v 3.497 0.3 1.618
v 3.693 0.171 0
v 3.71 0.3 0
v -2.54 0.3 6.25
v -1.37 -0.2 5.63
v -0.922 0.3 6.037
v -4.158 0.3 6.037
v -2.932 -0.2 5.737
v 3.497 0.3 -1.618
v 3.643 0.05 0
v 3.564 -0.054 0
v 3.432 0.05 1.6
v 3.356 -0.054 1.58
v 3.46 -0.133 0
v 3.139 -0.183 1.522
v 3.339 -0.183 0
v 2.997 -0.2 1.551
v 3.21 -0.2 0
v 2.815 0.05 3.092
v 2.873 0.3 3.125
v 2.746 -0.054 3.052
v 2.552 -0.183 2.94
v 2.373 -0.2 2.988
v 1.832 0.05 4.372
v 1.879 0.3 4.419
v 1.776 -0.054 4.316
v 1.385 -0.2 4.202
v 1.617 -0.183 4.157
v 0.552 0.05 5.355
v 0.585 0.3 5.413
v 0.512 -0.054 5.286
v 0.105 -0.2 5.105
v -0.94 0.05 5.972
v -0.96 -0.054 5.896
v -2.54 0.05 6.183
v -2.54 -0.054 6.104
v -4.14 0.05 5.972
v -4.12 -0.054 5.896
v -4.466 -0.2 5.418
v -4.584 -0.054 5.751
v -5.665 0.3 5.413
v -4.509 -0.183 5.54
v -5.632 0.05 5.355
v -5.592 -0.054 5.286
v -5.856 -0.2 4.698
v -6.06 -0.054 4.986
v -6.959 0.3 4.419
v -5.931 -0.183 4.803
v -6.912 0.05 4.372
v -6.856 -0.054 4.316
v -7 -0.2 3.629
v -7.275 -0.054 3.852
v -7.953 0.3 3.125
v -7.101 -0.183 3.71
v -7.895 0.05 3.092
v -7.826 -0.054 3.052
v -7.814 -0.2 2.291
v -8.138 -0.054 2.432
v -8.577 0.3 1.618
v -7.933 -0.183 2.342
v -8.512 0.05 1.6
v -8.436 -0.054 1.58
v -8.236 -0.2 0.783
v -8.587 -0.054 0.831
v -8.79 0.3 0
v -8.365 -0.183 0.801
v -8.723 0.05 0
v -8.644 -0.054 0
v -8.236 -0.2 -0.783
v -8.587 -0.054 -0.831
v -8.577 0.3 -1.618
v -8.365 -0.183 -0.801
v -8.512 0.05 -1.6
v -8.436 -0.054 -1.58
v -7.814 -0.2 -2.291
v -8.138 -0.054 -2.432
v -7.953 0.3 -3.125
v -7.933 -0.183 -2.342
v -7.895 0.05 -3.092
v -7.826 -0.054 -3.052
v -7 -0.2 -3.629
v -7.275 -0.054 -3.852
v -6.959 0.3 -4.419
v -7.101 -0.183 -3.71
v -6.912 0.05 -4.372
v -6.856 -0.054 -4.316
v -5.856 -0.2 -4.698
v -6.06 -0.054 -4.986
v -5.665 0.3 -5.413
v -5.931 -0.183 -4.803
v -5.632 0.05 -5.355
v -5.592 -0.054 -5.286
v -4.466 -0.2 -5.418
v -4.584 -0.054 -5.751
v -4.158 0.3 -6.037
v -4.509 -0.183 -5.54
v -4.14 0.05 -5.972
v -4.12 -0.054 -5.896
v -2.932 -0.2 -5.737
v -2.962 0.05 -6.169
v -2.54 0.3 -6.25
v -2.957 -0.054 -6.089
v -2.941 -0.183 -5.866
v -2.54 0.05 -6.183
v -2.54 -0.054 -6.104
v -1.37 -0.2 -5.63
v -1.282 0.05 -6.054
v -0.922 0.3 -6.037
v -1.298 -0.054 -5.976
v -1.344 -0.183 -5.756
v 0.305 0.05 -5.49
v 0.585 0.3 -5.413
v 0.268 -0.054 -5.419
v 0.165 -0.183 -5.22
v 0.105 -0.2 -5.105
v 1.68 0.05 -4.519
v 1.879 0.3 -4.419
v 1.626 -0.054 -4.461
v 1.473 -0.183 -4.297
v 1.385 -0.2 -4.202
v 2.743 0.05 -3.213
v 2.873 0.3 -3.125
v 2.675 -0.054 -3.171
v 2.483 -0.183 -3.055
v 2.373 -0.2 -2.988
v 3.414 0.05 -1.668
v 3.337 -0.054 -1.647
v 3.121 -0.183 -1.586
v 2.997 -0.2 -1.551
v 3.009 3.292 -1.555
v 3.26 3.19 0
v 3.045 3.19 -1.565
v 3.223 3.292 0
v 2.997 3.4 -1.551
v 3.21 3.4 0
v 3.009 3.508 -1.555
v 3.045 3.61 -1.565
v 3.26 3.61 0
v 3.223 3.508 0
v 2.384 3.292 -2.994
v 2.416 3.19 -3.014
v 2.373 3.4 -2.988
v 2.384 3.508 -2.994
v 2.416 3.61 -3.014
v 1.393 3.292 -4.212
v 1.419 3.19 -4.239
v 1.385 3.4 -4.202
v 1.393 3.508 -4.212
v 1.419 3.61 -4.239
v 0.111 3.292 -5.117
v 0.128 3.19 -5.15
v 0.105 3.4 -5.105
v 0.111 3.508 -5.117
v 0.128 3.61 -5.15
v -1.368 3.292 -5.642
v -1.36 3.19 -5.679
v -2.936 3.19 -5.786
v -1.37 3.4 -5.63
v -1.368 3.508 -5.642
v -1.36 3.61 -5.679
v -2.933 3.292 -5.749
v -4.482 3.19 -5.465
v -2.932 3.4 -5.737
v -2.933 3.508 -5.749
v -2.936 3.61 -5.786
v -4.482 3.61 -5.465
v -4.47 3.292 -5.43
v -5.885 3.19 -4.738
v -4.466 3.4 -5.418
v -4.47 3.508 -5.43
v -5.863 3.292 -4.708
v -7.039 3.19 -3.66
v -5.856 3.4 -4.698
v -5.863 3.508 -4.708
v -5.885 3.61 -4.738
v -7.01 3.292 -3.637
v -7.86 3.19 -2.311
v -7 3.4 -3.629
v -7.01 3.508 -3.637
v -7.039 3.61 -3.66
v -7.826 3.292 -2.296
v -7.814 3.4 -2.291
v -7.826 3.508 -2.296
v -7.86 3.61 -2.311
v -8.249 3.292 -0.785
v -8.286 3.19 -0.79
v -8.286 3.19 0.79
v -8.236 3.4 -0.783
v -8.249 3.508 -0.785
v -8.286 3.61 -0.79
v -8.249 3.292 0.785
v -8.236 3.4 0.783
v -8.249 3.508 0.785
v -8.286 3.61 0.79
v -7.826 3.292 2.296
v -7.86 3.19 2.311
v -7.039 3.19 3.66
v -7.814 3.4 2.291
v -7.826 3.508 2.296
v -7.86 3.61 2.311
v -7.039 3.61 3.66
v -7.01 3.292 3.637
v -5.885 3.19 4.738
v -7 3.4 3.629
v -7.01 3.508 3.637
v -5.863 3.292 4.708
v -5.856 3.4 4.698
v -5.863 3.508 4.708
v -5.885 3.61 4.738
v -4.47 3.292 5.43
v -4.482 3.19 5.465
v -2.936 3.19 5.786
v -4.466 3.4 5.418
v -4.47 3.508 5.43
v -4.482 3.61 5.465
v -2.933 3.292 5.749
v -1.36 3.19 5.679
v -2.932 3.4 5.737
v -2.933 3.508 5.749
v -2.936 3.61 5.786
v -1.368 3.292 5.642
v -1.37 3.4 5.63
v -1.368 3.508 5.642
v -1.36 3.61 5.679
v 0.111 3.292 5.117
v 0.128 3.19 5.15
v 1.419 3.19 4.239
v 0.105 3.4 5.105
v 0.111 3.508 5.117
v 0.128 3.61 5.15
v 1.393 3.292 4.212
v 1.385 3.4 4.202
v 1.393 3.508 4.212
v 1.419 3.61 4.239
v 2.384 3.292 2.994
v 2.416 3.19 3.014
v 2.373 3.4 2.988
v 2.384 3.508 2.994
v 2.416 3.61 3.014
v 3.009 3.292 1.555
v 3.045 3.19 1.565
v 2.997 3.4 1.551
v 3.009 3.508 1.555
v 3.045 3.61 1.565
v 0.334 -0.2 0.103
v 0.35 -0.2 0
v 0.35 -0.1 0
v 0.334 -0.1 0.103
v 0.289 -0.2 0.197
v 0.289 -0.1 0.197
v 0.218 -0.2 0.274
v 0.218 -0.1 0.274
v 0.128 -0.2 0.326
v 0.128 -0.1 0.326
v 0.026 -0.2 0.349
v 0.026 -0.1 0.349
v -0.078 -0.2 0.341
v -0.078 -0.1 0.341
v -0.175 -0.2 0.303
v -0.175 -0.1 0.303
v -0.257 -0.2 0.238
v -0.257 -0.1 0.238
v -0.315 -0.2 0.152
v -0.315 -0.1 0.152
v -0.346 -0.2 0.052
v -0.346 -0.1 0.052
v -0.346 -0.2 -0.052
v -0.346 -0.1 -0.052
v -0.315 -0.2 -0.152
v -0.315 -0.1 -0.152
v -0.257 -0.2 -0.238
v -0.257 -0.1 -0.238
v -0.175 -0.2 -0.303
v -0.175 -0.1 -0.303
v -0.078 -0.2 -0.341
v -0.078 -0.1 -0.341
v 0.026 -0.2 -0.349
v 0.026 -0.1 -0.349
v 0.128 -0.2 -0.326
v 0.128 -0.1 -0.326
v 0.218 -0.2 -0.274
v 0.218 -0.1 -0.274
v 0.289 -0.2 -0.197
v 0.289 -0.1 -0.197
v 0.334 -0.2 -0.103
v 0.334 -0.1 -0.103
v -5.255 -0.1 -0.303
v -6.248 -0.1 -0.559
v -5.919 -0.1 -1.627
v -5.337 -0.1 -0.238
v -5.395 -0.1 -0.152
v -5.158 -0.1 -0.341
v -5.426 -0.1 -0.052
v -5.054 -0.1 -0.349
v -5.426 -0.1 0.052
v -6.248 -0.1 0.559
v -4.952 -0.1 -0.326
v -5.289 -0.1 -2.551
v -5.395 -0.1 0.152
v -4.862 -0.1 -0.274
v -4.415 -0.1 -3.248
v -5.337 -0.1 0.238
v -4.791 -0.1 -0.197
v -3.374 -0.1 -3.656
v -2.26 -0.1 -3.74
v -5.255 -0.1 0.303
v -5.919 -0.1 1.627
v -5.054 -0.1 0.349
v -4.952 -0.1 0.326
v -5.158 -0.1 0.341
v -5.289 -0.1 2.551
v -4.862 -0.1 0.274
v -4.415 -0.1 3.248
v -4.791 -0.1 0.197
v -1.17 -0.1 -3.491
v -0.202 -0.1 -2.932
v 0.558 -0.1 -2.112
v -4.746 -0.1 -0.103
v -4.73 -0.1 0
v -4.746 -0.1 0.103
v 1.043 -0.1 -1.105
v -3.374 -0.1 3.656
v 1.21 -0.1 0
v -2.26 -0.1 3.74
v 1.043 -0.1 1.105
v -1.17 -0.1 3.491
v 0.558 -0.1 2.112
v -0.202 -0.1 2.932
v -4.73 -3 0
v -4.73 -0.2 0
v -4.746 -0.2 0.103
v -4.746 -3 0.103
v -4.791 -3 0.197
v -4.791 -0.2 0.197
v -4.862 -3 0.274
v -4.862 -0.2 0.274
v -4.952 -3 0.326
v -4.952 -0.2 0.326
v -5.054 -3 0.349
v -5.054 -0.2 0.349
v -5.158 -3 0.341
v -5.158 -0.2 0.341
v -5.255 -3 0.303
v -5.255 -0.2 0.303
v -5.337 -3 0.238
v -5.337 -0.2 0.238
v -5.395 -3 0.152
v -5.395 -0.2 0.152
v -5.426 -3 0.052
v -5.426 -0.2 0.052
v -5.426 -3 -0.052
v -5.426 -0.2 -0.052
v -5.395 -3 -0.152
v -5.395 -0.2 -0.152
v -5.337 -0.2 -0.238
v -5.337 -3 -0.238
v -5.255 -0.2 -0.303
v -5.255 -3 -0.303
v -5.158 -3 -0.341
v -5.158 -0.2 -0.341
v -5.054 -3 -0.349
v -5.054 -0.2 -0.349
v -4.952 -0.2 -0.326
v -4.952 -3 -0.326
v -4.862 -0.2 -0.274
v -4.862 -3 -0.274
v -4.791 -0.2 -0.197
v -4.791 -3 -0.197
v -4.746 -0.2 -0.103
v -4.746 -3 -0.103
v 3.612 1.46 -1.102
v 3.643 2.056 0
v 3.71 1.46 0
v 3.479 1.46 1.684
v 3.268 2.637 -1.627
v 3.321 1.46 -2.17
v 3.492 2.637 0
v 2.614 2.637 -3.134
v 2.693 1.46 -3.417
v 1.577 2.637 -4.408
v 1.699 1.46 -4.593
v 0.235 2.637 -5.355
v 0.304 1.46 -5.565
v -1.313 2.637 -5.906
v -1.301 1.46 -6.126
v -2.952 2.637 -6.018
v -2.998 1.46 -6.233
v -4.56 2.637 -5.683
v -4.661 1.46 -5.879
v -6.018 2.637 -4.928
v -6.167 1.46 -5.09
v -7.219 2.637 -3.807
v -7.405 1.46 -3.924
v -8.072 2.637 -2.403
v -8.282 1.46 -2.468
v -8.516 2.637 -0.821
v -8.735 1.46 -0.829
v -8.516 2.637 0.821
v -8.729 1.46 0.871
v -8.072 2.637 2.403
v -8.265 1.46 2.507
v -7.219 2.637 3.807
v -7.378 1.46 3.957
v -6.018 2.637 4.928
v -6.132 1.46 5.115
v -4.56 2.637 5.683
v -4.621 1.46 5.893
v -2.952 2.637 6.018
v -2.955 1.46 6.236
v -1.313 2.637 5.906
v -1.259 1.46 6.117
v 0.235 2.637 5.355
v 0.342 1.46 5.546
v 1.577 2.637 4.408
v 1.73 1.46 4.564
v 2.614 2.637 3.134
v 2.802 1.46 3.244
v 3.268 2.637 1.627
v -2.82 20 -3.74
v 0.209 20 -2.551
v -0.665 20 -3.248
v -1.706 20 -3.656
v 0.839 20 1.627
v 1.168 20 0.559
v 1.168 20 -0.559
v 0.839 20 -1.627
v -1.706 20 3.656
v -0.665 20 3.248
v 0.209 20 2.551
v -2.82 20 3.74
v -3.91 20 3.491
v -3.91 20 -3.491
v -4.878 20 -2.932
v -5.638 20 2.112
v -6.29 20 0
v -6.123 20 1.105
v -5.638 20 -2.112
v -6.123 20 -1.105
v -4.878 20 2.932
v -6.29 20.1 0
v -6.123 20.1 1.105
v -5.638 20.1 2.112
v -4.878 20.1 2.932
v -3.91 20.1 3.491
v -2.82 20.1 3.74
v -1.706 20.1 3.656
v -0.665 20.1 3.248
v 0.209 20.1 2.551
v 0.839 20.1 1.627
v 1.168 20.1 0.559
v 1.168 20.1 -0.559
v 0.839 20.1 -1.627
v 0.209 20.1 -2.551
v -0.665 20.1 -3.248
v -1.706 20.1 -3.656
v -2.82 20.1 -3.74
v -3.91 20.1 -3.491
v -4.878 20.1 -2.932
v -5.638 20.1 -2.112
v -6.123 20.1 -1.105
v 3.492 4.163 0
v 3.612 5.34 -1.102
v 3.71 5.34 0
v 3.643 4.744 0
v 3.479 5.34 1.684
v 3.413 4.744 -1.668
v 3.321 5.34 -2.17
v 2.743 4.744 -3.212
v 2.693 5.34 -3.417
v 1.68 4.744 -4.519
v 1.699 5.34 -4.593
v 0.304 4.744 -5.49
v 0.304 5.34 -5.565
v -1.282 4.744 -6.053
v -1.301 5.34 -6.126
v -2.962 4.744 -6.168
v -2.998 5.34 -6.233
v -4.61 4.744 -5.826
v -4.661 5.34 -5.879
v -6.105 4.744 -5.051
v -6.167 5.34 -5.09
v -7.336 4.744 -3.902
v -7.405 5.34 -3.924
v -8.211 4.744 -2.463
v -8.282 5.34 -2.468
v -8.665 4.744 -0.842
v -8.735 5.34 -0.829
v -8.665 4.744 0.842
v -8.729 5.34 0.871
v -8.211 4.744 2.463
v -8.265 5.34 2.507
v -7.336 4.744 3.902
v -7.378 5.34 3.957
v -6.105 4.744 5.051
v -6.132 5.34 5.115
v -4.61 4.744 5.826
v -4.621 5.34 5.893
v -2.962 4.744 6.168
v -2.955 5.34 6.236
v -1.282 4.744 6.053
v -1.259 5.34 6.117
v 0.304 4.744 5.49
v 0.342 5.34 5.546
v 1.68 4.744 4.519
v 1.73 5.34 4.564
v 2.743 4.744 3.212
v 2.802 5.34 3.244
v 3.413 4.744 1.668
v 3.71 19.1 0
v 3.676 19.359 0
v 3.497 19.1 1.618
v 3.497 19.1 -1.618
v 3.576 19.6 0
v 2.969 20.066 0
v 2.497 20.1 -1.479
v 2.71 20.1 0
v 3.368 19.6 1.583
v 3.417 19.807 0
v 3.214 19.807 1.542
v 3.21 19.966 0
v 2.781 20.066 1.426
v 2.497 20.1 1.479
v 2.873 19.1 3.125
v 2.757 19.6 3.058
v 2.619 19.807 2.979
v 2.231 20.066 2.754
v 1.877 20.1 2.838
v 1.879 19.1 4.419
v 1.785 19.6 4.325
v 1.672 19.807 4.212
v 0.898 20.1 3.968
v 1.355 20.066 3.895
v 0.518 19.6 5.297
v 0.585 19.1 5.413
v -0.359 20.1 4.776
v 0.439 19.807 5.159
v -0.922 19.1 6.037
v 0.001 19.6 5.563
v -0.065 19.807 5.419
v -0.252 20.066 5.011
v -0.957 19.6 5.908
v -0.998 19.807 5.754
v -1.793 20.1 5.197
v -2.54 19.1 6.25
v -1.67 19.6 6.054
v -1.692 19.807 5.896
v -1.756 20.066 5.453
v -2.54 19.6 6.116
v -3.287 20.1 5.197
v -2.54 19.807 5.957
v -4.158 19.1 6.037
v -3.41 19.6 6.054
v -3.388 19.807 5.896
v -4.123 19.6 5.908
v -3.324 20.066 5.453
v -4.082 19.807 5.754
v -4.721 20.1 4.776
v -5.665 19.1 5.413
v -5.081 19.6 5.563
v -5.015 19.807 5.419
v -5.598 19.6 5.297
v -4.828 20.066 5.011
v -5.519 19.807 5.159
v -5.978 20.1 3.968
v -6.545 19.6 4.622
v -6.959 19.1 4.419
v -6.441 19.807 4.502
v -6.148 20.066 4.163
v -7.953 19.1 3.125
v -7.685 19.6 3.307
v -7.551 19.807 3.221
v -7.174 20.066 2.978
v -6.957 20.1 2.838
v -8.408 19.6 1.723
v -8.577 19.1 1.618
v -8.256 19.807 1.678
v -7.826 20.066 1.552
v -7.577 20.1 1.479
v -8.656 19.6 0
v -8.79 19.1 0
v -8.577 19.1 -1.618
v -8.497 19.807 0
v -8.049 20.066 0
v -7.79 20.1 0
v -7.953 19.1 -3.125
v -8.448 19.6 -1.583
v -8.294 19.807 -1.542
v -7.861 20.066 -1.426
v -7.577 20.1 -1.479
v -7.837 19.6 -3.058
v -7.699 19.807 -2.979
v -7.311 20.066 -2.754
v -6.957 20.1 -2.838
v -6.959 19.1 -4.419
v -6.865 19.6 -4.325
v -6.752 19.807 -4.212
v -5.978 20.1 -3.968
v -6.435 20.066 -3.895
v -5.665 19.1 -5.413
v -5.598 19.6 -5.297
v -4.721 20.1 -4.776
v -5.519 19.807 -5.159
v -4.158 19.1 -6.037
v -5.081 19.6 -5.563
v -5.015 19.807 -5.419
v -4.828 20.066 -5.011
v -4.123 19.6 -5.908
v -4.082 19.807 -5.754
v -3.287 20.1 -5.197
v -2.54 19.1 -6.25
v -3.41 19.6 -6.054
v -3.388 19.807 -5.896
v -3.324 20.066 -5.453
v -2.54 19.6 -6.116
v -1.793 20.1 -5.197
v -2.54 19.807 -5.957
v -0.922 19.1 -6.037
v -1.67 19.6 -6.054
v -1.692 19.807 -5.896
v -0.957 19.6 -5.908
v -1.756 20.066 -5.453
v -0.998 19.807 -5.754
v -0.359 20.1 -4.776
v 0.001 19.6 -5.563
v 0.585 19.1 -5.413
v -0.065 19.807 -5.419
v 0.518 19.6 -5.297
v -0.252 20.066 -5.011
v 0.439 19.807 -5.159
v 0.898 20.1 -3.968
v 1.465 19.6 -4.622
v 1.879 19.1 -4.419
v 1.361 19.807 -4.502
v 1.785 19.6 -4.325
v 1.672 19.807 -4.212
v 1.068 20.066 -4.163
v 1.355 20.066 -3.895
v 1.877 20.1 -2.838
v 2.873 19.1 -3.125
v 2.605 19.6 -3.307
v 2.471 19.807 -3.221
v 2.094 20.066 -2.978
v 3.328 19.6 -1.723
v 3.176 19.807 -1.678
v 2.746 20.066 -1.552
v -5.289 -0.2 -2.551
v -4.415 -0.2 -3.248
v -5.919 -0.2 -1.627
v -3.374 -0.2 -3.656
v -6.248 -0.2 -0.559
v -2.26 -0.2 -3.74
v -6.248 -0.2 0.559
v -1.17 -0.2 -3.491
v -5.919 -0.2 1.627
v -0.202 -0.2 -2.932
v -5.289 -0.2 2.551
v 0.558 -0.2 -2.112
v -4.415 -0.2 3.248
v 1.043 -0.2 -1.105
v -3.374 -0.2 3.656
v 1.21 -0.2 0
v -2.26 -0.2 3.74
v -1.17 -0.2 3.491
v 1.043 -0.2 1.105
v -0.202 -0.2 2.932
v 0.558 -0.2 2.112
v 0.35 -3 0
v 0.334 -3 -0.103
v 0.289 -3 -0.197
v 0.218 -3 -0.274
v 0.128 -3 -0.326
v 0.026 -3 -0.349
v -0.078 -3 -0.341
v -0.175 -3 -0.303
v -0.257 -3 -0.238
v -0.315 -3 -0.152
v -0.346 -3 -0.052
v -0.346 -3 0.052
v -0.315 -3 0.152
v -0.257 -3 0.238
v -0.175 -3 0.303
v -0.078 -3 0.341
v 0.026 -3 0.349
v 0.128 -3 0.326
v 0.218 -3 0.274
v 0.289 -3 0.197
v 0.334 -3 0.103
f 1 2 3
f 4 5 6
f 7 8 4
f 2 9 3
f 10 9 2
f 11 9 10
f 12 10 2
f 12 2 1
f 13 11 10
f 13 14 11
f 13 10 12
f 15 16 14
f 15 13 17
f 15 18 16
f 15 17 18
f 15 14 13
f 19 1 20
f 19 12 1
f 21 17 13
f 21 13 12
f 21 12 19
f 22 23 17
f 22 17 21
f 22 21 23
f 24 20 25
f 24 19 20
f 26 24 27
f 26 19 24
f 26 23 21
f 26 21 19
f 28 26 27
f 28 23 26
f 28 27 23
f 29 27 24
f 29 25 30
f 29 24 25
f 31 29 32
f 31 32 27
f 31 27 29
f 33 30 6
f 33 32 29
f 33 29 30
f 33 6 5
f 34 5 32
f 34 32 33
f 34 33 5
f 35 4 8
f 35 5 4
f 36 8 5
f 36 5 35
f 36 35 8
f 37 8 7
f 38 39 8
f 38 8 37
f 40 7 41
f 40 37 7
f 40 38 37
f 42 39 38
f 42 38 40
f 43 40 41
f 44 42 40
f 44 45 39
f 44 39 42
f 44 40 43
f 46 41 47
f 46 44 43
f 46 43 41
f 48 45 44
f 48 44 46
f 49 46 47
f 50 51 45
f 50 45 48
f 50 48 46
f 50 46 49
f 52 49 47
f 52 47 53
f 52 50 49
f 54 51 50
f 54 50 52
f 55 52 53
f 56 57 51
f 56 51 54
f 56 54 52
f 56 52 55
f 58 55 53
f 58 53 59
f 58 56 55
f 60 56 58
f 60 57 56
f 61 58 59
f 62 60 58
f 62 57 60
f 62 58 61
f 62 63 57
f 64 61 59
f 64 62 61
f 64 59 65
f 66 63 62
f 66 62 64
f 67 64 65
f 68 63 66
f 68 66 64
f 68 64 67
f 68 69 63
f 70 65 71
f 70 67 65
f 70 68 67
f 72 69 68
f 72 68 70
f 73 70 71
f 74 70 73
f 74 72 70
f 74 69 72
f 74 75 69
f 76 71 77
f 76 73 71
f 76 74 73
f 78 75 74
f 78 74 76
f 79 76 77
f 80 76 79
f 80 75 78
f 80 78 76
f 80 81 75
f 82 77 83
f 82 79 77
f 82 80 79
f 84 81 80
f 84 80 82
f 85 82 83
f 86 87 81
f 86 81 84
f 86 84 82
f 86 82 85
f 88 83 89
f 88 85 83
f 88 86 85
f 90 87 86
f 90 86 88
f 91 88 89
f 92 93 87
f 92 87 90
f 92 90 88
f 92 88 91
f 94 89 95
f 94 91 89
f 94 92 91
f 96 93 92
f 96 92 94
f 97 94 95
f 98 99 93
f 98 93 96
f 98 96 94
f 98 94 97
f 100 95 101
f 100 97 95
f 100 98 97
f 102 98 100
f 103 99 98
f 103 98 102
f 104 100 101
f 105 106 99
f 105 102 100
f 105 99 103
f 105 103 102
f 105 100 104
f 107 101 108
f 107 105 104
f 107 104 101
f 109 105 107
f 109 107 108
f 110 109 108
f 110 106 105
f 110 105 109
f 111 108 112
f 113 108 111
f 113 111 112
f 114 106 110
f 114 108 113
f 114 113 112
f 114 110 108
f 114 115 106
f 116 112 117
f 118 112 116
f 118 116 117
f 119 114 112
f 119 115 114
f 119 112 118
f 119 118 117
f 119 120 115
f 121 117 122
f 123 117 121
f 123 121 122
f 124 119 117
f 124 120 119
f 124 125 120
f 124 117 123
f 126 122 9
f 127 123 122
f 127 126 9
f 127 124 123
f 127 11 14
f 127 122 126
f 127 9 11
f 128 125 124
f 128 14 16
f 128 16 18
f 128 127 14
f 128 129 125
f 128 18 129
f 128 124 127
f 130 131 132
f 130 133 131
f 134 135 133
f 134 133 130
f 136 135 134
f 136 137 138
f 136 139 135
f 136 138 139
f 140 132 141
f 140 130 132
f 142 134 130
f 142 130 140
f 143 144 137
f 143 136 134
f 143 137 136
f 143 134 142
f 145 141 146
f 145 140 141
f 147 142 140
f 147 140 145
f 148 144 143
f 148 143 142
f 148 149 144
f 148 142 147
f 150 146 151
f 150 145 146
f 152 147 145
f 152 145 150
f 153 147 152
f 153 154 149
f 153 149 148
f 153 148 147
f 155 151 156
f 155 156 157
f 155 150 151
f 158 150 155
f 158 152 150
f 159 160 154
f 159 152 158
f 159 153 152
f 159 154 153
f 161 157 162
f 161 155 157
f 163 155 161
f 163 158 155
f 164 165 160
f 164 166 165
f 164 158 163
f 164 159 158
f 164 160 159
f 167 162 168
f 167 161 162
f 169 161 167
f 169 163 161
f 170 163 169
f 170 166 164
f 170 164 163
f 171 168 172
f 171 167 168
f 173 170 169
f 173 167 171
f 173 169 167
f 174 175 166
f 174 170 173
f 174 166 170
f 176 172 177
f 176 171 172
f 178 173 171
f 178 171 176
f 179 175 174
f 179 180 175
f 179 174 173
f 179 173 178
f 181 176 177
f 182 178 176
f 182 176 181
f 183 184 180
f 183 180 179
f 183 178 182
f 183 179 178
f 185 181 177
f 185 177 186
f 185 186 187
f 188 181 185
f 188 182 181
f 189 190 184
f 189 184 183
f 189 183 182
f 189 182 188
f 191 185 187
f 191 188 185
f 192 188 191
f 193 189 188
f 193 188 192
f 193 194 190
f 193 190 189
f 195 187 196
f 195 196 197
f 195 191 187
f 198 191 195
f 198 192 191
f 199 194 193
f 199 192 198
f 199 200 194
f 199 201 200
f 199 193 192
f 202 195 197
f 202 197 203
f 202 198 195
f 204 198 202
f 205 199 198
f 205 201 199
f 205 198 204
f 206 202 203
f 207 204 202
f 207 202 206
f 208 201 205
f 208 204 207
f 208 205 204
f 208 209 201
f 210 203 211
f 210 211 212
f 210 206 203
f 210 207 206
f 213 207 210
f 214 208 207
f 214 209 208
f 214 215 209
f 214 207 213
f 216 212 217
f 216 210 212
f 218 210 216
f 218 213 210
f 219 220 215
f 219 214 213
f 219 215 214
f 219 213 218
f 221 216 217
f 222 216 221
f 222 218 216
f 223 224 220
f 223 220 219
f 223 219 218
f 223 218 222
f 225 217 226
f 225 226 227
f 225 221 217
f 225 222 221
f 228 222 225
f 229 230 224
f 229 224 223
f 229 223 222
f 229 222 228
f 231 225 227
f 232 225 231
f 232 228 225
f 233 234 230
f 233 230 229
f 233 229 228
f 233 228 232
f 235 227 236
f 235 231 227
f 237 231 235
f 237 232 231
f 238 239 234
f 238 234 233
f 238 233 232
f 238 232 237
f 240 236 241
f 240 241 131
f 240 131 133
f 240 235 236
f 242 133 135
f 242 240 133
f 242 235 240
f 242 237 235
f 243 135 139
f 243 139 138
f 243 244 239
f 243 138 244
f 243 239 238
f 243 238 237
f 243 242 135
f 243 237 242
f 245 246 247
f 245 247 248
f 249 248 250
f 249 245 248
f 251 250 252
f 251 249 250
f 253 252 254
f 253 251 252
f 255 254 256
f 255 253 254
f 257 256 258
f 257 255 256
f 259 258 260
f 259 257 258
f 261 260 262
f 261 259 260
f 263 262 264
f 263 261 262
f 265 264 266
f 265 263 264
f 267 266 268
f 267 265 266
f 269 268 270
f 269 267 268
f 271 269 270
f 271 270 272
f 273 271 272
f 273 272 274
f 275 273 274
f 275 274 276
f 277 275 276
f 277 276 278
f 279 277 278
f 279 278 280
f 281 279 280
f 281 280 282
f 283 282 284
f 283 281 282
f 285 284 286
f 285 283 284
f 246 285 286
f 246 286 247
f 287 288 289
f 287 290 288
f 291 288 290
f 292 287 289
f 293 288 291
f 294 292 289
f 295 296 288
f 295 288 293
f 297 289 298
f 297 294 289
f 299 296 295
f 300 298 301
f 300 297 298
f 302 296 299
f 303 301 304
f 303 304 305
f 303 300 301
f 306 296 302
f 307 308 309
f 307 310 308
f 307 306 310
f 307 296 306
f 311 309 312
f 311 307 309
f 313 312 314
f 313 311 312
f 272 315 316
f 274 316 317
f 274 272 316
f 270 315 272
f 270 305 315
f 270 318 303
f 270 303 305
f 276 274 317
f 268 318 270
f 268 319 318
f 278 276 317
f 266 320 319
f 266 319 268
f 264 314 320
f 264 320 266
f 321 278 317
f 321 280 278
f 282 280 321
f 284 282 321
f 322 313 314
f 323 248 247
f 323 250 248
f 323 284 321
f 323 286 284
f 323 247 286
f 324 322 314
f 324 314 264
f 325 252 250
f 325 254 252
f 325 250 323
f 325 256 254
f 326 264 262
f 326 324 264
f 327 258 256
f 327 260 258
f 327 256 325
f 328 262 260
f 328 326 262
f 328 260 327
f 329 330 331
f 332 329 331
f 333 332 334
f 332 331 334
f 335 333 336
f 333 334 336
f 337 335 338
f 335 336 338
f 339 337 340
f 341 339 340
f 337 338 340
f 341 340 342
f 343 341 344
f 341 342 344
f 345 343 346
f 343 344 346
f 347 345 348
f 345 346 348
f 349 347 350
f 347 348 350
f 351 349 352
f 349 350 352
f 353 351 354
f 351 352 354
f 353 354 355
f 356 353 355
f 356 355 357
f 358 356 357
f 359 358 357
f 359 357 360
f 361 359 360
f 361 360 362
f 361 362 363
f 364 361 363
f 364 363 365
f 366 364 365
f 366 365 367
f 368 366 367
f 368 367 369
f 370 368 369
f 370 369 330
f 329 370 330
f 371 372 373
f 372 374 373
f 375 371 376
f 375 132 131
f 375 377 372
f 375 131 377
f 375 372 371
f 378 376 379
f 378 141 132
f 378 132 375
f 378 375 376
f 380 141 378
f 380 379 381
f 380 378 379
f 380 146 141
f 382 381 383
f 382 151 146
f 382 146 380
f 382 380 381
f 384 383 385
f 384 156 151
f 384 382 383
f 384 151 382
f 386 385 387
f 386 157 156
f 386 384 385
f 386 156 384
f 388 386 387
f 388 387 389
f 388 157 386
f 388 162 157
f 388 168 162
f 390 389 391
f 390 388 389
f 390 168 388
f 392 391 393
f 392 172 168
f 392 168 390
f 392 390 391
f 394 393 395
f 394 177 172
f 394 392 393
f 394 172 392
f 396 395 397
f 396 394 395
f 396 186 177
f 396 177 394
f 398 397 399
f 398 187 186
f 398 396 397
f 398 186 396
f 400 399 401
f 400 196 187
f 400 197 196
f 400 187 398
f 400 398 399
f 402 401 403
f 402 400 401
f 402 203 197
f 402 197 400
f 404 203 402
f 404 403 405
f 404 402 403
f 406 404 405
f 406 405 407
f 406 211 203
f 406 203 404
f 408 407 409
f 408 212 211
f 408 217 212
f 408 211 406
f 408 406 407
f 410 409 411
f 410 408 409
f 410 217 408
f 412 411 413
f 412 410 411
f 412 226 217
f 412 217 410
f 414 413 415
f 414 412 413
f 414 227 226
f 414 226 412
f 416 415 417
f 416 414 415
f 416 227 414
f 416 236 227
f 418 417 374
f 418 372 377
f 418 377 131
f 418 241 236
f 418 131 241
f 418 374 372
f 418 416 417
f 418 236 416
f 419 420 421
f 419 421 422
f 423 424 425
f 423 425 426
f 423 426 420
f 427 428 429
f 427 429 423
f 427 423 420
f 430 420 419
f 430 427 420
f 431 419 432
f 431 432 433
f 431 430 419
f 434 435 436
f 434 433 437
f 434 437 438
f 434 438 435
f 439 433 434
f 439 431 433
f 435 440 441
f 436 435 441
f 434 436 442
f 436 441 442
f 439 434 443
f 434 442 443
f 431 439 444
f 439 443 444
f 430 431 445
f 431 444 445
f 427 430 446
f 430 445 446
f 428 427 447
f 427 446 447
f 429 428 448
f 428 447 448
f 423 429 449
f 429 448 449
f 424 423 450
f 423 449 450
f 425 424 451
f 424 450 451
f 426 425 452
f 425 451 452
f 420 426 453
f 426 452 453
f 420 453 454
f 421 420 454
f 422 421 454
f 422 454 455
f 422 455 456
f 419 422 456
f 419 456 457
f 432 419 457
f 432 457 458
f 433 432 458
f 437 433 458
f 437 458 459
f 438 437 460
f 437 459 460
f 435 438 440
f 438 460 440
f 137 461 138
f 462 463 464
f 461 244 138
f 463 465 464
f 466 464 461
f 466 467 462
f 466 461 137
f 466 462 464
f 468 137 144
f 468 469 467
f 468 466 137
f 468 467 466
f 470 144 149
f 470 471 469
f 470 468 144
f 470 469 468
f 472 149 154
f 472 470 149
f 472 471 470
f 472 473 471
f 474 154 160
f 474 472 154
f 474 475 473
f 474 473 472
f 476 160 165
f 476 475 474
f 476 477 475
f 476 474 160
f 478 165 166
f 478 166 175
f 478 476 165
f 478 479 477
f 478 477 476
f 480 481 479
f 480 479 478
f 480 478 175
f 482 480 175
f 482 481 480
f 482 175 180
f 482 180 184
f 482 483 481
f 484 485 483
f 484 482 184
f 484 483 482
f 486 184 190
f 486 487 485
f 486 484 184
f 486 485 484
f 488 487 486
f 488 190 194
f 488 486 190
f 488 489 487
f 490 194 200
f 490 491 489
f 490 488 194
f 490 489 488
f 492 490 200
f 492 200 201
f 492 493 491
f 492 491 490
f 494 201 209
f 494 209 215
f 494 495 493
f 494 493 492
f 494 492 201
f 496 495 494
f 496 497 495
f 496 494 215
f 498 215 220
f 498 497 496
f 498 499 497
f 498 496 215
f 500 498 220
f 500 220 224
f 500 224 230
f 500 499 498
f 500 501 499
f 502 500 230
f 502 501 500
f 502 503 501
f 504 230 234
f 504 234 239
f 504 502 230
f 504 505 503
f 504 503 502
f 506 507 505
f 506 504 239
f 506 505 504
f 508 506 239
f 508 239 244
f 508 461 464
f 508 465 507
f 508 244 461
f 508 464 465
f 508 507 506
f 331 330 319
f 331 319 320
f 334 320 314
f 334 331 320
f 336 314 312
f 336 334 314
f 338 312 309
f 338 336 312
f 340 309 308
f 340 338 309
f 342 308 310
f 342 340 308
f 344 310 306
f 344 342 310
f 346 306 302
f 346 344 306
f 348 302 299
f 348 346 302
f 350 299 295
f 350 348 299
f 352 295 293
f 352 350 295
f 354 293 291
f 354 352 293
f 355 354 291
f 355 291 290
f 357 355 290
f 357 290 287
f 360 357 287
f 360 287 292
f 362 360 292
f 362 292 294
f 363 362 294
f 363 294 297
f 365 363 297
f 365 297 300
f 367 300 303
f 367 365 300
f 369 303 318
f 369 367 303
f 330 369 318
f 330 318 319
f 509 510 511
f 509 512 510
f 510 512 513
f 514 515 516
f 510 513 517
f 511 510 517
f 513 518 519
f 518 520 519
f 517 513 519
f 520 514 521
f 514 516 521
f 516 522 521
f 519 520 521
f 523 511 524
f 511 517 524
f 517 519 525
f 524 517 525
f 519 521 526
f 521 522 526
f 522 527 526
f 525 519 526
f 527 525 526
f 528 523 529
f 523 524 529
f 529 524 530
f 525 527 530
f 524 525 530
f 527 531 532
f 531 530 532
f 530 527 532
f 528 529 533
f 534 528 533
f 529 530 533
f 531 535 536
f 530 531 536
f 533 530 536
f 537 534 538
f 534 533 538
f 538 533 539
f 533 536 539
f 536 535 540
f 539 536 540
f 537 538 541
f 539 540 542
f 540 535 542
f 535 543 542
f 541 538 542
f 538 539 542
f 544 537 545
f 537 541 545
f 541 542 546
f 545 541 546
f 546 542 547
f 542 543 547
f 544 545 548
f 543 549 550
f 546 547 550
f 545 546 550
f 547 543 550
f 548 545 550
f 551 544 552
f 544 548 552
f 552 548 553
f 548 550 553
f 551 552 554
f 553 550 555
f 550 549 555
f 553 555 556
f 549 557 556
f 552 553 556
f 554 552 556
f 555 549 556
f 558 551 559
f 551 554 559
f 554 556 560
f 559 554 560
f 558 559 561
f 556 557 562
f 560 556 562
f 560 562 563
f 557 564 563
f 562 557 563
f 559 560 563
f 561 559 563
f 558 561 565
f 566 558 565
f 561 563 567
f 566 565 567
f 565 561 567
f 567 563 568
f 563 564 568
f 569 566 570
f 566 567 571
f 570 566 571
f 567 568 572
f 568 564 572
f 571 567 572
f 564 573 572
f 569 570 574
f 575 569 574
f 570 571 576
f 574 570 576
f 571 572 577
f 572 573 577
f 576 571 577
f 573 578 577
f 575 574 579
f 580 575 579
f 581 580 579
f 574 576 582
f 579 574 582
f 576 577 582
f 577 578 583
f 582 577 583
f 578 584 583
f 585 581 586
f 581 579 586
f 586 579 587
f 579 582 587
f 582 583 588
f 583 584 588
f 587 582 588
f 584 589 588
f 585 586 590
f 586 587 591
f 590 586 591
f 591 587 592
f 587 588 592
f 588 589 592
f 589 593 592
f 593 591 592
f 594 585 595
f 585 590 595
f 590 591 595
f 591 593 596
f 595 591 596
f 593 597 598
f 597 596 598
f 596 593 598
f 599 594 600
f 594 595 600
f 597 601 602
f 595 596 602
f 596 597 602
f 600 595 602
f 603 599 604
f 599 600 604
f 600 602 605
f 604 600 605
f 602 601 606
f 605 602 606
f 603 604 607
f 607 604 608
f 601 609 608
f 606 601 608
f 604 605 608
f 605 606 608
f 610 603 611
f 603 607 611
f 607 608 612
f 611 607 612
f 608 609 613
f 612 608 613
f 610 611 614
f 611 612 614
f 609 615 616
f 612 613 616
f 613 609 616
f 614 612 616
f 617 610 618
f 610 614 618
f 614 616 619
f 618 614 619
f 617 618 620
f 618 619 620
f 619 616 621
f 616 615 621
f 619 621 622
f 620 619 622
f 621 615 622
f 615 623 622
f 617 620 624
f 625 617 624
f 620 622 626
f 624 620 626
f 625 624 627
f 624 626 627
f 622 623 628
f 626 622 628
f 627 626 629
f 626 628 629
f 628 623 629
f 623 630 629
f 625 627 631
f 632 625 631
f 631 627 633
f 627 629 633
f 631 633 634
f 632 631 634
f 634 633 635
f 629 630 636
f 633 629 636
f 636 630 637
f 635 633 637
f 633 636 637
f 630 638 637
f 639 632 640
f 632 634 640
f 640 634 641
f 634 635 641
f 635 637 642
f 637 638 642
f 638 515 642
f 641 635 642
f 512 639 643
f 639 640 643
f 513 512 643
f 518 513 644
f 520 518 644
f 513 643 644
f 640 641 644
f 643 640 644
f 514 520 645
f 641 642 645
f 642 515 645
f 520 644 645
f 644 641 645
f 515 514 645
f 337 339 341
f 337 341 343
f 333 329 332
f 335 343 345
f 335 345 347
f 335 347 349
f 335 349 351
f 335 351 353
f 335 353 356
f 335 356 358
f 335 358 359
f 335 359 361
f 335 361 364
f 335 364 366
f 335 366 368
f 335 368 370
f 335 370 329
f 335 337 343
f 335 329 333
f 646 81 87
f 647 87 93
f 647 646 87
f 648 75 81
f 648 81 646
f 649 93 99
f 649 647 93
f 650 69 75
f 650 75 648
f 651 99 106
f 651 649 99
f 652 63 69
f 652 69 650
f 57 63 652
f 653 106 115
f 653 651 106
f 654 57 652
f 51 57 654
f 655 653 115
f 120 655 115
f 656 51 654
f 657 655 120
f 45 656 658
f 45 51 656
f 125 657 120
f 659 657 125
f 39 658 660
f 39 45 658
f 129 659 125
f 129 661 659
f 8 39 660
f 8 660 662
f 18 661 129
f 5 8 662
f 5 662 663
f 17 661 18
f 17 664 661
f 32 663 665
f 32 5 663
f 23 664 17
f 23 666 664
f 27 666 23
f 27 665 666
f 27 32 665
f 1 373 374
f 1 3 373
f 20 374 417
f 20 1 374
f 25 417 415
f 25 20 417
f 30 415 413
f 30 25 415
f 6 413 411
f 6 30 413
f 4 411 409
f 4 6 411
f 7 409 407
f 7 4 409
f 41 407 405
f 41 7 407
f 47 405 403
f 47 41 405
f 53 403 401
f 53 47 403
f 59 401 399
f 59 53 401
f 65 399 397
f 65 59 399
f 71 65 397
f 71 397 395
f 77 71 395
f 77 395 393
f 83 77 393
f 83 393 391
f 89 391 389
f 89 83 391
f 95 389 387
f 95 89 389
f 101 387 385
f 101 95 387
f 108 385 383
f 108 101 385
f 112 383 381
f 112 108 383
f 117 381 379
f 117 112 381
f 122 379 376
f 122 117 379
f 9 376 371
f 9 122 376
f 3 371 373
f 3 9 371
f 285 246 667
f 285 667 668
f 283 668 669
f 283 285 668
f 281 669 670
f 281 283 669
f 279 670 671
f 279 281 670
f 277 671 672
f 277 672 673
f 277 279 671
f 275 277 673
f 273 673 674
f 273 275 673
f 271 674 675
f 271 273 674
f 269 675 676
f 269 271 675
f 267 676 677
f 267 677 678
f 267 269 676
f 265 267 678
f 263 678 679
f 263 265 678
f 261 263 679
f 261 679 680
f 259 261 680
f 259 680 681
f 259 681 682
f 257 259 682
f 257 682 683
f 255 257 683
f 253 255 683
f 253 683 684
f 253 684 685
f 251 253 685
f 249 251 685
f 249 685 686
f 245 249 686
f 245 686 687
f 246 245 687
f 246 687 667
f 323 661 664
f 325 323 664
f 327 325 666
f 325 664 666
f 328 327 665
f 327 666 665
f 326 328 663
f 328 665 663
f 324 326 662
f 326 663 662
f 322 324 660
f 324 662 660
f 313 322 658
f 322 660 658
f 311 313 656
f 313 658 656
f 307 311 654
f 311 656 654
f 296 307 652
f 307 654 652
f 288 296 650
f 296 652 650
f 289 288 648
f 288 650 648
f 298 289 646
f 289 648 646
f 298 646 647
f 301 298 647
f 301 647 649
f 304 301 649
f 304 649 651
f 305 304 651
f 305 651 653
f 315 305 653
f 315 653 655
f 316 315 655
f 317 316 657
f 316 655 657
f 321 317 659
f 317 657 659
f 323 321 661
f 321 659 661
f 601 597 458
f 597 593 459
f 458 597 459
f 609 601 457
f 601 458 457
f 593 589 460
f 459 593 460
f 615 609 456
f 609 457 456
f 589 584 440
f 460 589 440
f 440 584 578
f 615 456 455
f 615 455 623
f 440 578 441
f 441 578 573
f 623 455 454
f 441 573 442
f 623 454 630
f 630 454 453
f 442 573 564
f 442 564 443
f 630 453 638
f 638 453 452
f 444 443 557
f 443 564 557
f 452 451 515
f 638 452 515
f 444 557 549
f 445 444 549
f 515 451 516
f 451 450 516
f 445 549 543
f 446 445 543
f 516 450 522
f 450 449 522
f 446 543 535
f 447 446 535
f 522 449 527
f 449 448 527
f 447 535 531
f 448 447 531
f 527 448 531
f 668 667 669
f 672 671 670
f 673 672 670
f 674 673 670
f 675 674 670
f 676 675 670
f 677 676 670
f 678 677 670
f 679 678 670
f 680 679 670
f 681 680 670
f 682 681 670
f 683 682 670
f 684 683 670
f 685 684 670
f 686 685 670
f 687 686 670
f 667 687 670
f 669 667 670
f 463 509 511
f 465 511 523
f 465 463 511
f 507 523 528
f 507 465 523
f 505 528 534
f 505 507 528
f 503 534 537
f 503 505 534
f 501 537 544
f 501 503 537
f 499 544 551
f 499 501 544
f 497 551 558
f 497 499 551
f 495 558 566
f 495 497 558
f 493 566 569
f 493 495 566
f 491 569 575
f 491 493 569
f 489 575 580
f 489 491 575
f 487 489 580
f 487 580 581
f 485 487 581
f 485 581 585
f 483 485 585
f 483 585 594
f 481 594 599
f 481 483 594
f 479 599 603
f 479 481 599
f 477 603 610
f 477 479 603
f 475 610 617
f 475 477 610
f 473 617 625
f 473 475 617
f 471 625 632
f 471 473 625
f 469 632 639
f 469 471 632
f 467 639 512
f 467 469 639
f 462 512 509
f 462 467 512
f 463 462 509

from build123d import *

# Parameters (mm, degrees)
SKETCH2_R                = 0.35
BASE_EXTRUDE_DEPTH       = 3
SKETCH3_R                = 3.75
BOSS_EXTRUDE1_DEPTH      = 0.5
SKETCH4_R                = 0.35
BOSS_EXTRUDE2_DEPTH      = 3
SKETCH5_R                = 6.25
BOSS_EXTRUDE4_DEPTH      = 0.1
BOSS_EXTRUDE4_DEPTH_BACK = 20.2
SKETCH7_R                = 3.75
SKETCH7_R_2              = 0.35
CUT_EXTRUDE3_DEPTH       = 0.1
FILLET1_R                = 0.5
FILLET2_R                = 1
SKETCH8_R                = 3.75
CUT_EXTRUDE4_DEPTH       = 0.1


with BuildPart() as part:
    # Sketch2 → Base-Extrude (new body)
    with BuildSketch(Plane(origin=(0, 0, 0), x_dir=(1, 0, 0), z_dir=(0, 1, 0))):
        Circle(SKETCH2_R)
    extrude(amount=-BASE_EXTRUDE_DEPTH)

    # Sketch3 → Boss-Extrude1 (add)
    with BuildSketch(Plane(origin=(0, 0, 0), x_dir=(-1, 0, 0), z_dir=(0, 1, 0))):
        with Locations((2.54, 0)):
            Circle(SKETCH3_R)
    extrude(amount=BOSS_EXTRUDE1_DEPTH)

    # Sketch4 → Boss-Extrude2 (add)
    with BuildSketch(Plane.XZ):
        with Locations((-5.08, 0)):
            Circle(SKETCH4_R)
    extrude(amount=BOSS_EXTRUDE2_DEPTH)

    # Sketch5 → Boss-Extrude4 (add, two sides)
    with BuildSketch(Plane.XZ.offset(0.1)) as boss_extrude4_sk:
        with Locations((-2.54, 0)):
            Circle(SKETCH5_R)
    extrude(amount=BOSS_EXTRUDE4_DEPTH)
    extrude(boss_extrude4_sk.sketch, amount=-BOSS_EXTRUDE4_DEPTH_BACK)

    # Sketch7 → Cut-Extrude3 (cut)
    with BuildSketch(Plane.XZ.offset(0.2)):
        with Locations((-2.54, 0)):
            Circle(SKETCH7_R)
        with Locations((-5.08, 0)):
            Circle(SKETCH7_R_2, mode=Mode.SUBTRACT)
        Circle(SKETCH7_R_2, mode=Mode.SUBTRACT)
    extrude(amount=-CUT_EXTRUDE3_DEPTH, mode=Mode.SUBTRACT)

    # Fillet1
    fillet1_edges = [part.edges().sort_by_distance(p)[0] for p in [
        (-8.79, -0.2, 0),
    ]]
    fillet(fillet1_edges, radius=FILLET1_R)

    # Fillet2
    fillet2_edges = [part.edges().sort_by_distance(p)[0] for p in [
        (-8.79, 20.1, 0),
    ]]
    fillet(fillet2_edges, radius=FILLET2_R)

    # Sketch8 → Cut-Extrude4 (cut)
    with BuildSketch(Plane(origin=(0, 20.1, 0), x_dir=(-1, 0, 0), z_dir=(0, 1, 0))):
        with Locations((2.54, 0)):
            Circle(SKETCH8_R)
    extrude(amount=-CUT_EXTRUDE4_DEPTH, mode=Mode.SUBTRACT)

    # Sketch10 → Cut-Revolve1 (revolve, cut)
    with BuildSketch(Plane.XY):
        with BuildLine():
            Line((3.71, 5.69), (4.21, 5.69))
            Line((4.21, 5.69), (4.21, 1.11))
            Line((4.21, 1.11), (3.71, 1.11))
            ThreePointArc((3.71, 1.11), (3.618018735, 2.178778092), (3.26, 3.19))
            ThreePointArc((3.26, 3.19), (3.21, 3.4), (3.26, 3.61))
            ThreePointArc((3.26, 3.61), (3.618018735, 4.621221908), (3.71, 5.69))
        make_face()
    revolve(axis=Axis((-2.54, 0.346345216, 0), (0, 1, 0)), mode=Mode.SUBTRACT)


solid = part.part
